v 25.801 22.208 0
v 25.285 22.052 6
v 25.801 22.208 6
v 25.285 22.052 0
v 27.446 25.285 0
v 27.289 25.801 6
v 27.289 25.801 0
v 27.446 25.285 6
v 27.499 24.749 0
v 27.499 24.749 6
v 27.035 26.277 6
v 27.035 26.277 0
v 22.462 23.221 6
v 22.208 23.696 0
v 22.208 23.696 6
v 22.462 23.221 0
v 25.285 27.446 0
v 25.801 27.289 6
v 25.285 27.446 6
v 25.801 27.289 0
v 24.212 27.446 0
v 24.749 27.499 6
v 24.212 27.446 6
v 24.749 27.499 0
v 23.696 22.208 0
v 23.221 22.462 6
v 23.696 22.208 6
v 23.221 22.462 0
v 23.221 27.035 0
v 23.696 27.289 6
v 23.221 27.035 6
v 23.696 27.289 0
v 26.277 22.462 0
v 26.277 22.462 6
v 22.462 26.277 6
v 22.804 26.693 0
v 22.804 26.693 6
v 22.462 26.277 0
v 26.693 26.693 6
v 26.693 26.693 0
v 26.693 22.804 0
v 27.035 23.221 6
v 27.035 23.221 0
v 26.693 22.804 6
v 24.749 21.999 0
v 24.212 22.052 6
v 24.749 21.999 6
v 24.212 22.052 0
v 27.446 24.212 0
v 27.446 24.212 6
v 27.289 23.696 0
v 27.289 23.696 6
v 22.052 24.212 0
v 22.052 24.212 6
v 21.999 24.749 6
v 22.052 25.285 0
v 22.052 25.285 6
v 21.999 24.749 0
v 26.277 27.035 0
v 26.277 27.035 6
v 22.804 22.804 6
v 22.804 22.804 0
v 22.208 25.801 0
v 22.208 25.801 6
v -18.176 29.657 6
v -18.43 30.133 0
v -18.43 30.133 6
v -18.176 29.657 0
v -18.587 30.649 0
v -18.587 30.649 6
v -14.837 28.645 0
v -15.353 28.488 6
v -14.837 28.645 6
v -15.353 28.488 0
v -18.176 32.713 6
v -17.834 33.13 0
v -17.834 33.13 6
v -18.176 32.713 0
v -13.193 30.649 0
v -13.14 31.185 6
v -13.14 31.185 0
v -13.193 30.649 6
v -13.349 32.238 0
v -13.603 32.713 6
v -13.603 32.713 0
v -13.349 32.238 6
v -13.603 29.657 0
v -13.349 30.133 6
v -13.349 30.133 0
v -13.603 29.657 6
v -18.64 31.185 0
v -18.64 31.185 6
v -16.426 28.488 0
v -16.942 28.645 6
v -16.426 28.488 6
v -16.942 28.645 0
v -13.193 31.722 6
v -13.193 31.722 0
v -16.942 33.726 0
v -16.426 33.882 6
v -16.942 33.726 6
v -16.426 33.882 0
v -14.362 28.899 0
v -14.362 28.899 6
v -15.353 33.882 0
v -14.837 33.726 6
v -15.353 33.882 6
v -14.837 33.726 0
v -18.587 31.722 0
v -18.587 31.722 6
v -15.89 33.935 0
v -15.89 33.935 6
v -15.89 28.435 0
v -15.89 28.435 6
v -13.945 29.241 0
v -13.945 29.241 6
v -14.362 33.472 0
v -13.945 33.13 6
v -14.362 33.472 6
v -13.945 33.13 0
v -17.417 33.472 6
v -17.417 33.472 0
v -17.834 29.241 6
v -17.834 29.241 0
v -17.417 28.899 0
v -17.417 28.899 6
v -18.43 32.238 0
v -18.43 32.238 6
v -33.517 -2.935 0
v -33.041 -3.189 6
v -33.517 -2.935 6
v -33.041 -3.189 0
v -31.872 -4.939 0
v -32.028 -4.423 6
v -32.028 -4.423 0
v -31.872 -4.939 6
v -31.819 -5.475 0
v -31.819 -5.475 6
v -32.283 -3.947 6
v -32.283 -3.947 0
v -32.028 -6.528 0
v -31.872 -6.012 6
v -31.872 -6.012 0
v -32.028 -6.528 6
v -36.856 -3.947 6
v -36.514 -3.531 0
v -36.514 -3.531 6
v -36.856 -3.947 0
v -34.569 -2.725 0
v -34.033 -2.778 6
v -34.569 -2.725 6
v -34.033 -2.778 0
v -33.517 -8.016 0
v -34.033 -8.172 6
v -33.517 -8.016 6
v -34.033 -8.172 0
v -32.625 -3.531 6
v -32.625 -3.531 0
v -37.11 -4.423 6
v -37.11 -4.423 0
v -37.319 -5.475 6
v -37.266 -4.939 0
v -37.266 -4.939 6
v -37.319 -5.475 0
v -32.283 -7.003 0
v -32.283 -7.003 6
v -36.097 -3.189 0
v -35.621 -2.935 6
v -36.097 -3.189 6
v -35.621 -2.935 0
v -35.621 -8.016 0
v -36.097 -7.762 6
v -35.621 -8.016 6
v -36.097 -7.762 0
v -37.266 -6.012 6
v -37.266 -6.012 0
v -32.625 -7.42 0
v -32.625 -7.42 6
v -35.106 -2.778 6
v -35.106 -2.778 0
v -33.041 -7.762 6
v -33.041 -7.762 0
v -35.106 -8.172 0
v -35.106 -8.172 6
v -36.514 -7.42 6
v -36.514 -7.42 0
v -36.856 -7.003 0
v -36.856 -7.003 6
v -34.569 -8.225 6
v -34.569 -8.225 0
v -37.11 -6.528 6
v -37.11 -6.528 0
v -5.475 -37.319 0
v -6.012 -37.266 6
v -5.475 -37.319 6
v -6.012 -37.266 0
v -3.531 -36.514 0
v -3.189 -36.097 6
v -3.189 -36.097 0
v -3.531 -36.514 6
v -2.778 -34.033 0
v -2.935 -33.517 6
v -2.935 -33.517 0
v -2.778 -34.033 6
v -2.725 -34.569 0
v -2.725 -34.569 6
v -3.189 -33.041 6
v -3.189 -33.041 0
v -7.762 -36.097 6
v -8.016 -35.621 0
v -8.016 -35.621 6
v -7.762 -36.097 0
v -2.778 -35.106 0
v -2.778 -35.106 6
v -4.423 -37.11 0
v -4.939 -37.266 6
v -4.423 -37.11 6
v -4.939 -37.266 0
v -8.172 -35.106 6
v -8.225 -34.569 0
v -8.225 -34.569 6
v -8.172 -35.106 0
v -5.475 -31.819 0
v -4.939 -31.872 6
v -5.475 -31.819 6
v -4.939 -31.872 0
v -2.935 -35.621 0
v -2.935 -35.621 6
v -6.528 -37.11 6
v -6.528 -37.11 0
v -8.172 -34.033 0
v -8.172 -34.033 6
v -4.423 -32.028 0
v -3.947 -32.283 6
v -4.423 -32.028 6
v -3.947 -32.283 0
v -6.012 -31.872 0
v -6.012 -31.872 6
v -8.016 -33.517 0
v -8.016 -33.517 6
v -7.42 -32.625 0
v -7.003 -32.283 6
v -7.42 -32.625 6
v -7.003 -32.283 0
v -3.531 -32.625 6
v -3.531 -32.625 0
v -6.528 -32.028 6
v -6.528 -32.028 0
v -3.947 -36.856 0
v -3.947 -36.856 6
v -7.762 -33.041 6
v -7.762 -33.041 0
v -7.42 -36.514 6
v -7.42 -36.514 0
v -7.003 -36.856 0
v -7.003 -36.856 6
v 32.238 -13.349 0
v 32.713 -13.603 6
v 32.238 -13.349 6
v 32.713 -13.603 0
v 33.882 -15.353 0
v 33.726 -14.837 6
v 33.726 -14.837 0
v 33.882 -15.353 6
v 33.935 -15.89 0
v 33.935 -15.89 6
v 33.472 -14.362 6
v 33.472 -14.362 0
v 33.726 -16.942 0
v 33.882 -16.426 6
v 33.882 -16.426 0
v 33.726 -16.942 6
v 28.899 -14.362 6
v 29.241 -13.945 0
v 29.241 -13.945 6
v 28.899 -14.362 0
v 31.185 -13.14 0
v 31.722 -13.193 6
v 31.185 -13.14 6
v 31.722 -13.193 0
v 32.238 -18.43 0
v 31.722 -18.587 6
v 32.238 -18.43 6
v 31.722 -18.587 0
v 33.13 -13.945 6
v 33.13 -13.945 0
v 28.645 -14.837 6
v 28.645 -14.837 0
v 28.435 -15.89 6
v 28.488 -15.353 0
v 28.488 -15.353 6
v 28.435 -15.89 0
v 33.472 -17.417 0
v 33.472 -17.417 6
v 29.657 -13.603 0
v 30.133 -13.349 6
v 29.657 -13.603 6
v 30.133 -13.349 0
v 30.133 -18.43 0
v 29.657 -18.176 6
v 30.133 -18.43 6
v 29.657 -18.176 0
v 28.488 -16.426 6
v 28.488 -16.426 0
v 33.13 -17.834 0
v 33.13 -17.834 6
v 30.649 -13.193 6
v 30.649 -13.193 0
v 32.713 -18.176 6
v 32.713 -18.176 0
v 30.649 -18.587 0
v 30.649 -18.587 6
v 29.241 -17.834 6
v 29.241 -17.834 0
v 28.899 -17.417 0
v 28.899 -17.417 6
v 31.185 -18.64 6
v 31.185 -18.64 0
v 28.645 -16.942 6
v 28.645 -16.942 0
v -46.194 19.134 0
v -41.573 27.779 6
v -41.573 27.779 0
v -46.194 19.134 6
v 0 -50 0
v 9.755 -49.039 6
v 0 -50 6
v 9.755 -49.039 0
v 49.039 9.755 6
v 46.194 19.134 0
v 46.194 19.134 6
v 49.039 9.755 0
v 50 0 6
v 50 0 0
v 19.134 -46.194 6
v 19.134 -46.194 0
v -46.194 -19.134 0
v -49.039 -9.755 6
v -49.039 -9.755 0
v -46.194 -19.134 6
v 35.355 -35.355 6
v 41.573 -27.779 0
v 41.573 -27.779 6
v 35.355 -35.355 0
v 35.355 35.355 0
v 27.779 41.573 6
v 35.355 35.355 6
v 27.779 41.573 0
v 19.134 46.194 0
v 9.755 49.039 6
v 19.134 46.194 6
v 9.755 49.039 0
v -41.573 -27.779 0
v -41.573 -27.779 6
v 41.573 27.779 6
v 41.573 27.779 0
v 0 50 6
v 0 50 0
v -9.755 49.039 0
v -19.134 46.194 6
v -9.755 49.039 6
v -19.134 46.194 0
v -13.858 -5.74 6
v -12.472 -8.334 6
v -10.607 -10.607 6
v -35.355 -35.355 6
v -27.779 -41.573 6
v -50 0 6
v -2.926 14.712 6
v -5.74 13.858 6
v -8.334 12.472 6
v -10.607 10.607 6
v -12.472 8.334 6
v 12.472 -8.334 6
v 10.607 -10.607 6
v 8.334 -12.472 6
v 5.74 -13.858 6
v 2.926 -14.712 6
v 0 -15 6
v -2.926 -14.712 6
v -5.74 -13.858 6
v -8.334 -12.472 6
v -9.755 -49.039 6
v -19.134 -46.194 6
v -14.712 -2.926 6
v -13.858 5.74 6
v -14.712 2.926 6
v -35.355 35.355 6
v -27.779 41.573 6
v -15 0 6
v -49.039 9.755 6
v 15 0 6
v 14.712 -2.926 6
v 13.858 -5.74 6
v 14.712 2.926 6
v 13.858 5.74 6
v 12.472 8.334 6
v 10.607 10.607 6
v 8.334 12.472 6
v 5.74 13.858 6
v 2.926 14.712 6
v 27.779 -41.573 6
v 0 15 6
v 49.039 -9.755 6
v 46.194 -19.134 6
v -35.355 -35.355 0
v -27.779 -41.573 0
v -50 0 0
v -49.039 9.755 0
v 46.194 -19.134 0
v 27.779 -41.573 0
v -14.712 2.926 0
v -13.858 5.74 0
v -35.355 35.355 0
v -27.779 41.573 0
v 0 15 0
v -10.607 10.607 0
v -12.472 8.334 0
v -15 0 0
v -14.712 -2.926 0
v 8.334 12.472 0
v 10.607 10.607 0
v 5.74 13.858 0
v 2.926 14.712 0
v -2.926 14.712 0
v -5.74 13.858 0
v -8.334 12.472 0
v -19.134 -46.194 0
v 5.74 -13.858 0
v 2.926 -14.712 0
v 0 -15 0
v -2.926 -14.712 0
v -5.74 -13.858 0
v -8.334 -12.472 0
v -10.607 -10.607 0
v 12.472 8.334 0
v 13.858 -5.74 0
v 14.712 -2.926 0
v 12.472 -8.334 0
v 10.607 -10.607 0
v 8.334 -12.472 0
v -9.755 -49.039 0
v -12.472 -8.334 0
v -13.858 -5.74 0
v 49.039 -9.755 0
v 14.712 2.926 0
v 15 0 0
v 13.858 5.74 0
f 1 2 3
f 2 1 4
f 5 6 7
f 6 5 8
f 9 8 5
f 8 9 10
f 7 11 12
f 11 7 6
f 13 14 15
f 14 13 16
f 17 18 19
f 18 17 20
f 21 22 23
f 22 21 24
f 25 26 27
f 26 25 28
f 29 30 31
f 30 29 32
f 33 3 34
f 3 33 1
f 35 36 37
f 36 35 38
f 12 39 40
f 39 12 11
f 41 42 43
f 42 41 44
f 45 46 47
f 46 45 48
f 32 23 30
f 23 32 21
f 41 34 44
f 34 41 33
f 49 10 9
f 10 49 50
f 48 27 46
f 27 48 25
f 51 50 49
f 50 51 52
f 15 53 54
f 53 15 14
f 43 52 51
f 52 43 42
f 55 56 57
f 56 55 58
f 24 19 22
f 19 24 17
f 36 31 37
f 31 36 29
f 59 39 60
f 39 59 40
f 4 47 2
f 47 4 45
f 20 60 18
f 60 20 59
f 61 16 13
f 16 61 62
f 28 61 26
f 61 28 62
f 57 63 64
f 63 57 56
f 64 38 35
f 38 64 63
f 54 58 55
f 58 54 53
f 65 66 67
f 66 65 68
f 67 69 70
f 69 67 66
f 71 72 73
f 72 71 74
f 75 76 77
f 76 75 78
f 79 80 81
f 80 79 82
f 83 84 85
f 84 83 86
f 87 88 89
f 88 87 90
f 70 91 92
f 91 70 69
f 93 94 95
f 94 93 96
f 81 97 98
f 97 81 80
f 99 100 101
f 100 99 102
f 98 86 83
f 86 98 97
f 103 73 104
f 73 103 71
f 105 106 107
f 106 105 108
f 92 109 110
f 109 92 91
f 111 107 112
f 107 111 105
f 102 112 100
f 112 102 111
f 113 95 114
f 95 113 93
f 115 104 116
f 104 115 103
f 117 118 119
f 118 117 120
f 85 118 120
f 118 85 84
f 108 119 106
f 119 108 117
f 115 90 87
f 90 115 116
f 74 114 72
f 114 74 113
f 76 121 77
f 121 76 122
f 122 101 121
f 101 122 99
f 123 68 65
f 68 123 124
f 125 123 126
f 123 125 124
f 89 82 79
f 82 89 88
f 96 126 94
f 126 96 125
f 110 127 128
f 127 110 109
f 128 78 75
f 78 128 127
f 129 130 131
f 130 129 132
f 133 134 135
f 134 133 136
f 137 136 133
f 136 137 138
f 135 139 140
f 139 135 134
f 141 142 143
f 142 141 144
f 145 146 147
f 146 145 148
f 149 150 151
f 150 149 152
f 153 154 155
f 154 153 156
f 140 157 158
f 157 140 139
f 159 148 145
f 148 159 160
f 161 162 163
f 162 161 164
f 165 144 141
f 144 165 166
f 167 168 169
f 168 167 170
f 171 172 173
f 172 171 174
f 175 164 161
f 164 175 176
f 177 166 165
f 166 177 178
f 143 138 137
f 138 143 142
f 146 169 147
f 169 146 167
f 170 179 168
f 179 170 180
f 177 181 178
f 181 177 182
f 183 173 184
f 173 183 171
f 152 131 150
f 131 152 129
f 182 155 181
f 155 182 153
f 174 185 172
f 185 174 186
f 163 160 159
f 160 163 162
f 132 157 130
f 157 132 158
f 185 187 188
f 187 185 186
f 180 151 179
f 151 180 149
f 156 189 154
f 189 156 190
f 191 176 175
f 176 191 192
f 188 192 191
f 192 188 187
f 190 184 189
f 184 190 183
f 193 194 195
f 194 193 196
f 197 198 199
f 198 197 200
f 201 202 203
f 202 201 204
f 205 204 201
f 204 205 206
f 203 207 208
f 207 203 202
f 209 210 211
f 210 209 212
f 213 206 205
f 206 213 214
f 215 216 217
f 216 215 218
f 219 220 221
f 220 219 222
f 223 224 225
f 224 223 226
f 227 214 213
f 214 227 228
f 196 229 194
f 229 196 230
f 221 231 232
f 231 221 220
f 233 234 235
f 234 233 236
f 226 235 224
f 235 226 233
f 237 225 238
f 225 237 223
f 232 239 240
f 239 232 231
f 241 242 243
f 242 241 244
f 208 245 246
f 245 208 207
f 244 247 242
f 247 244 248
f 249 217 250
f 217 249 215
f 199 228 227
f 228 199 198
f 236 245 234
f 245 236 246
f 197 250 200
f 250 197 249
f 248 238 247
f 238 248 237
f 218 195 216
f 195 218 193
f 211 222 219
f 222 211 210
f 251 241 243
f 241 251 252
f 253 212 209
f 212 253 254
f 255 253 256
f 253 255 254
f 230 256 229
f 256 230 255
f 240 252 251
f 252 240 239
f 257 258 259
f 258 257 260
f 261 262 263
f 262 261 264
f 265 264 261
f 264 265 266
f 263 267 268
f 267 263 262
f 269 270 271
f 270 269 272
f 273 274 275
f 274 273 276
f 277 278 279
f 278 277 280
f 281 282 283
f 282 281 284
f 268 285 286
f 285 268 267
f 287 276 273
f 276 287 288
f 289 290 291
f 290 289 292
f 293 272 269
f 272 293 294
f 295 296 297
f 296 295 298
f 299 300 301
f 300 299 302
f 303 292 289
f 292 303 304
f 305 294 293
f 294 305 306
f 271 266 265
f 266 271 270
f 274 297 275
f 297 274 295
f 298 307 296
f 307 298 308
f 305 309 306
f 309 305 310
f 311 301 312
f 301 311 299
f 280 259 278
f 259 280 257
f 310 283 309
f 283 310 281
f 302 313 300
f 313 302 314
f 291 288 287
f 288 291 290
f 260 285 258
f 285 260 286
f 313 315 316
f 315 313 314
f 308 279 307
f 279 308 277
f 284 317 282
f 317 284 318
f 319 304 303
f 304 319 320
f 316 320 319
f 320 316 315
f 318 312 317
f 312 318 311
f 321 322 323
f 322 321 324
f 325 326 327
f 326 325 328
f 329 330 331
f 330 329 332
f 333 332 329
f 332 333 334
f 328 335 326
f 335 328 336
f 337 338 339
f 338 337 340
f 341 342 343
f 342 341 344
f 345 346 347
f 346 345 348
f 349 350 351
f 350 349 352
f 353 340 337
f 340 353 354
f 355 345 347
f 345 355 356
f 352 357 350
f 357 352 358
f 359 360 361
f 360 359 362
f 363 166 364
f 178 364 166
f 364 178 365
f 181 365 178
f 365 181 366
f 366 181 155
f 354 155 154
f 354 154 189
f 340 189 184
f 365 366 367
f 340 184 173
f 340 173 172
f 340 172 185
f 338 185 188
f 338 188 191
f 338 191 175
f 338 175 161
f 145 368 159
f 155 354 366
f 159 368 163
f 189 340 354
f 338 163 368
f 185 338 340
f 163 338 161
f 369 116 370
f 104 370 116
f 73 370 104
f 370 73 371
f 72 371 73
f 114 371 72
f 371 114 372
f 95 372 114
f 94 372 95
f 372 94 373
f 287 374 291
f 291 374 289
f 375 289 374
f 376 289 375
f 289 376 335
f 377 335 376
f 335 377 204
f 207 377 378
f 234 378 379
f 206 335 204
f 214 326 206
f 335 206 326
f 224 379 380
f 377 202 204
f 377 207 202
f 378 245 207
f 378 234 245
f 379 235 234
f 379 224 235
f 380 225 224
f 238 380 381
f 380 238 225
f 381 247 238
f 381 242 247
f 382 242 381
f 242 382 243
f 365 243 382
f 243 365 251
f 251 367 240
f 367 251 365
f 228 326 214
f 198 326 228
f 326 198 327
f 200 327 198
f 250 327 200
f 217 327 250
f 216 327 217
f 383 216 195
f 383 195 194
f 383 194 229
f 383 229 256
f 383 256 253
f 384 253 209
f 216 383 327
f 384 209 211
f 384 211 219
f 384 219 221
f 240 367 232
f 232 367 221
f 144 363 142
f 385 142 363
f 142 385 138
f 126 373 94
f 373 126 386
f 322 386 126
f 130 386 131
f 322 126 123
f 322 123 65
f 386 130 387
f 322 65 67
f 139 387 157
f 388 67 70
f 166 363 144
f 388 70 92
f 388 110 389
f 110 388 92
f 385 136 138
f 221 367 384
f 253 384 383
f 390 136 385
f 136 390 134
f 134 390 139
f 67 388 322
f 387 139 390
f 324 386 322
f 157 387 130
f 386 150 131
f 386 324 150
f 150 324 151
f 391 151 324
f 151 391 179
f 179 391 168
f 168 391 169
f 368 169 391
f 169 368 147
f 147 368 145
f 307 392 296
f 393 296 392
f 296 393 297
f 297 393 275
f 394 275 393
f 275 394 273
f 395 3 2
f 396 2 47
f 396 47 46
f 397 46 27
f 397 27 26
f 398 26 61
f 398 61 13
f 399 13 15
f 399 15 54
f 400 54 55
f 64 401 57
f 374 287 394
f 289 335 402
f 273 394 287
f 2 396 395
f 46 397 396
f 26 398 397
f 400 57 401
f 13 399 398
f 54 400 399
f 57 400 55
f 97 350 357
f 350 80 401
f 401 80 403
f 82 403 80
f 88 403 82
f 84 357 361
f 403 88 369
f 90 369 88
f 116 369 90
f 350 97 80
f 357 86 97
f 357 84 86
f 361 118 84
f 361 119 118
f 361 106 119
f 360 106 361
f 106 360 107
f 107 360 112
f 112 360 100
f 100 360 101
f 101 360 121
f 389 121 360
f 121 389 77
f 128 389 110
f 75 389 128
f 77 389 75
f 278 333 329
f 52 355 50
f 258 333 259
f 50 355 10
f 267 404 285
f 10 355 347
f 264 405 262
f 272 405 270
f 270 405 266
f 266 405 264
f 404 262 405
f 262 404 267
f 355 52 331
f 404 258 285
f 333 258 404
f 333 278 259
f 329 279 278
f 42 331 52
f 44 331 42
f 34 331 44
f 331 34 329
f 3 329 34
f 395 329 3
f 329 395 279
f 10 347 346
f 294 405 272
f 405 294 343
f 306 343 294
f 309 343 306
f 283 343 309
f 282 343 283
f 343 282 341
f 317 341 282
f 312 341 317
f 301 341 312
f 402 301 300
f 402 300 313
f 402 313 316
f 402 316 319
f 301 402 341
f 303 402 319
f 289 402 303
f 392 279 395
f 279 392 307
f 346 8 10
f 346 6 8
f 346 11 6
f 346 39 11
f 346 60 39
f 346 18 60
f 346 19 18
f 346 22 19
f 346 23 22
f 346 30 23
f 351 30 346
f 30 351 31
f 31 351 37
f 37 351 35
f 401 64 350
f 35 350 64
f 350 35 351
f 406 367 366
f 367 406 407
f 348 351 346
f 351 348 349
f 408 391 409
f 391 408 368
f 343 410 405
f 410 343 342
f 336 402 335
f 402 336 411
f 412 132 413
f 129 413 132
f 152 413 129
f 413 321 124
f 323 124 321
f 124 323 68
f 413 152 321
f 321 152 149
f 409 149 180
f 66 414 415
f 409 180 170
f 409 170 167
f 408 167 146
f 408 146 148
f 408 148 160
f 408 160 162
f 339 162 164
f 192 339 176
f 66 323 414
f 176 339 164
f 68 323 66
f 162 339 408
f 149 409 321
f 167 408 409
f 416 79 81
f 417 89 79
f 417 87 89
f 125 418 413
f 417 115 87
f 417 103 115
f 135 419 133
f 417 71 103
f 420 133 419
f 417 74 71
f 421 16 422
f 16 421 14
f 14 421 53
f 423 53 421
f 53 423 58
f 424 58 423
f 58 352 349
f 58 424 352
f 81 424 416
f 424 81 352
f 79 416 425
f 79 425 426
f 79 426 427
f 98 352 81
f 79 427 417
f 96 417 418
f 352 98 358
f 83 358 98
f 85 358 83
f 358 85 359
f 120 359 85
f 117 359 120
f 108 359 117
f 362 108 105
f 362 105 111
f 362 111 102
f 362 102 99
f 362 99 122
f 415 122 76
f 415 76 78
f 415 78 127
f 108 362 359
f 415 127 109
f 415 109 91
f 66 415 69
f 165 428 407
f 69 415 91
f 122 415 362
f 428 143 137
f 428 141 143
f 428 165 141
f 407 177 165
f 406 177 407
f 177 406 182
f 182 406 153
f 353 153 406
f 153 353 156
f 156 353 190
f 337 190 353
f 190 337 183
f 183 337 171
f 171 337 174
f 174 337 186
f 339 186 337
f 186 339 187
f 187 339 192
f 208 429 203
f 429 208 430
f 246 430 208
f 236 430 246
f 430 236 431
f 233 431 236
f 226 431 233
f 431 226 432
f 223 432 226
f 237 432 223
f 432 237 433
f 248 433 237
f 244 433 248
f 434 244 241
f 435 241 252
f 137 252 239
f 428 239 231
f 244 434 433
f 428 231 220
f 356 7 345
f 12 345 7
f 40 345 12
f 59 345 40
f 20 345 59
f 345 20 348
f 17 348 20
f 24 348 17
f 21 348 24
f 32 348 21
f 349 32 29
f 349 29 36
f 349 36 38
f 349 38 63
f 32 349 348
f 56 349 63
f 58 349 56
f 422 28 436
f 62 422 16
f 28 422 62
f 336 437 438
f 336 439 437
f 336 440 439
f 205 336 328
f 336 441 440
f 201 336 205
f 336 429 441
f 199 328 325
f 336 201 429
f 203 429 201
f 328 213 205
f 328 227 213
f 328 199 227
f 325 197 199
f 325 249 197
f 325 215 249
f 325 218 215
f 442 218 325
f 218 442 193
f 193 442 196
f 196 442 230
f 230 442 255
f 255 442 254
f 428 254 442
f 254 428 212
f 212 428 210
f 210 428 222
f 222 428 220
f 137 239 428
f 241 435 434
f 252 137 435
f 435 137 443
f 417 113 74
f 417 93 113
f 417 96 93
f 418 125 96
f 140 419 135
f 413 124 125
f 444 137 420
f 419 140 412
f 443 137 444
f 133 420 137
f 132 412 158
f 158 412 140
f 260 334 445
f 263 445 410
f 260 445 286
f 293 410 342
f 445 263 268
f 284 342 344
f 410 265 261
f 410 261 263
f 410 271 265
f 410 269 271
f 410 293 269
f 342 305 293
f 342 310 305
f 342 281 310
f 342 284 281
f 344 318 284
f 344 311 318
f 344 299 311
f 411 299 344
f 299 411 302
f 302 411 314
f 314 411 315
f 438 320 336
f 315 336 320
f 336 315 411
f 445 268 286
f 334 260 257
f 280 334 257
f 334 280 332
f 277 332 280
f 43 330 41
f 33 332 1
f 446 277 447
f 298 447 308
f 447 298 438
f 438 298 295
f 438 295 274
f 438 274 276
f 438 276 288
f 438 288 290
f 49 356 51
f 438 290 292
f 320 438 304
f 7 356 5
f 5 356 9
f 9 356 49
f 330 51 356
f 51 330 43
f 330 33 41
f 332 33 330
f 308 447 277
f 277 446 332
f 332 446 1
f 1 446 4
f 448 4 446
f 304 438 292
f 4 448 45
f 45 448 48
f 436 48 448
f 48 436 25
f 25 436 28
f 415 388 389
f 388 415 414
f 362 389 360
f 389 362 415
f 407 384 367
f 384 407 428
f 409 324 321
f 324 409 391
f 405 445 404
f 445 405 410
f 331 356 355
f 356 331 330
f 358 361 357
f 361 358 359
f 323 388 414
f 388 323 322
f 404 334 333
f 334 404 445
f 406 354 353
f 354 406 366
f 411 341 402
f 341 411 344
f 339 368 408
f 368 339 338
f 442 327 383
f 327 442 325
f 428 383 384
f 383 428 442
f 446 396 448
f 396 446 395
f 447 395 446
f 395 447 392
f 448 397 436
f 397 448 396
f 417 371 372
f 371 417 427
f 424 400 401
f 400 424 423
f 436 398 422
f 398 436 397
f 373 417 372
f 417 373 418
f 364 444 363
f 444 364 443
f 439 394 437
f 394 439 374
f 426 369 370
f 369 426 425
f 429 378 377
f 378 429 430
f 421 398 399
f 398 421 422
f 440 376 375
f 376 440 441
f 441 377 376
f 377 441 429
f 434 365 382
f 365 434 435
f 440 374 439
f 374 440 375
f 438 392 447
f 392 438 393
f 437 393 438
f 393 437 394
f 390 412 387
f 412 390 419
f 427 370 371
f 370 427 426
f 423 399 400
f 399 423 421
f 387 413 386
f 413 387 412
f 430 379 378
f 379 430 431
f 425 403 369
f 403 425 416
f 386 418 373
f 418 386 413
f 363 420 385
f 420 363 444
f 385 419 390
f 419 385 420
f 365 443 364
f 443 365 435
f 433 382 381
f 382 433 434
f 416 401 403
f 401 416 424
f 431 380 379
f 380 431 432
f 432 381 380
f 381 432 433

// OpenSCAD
$fn = 32;

// ----------------------------------------------------------------------
// Flange Ø100 x 6
// 5 holes on a Ø70 bolt circle, bolted joints
// ----------------------------------------------------------------------

// --- parameters (mm) ---
flange_d = 100;   // outside diameter of the flange
seat_tol = 0.05;  // tolerance at the seating features
free_tol = 0.3;   // general tolerance on the free sizes
thickness = 6;    // flange thickness
holes = 5;        // number of bolt holes
pcd = 70;         // bolt circle diameter
start_deg = 45;   // angle of the first hole, from +X
hole_d = 5.5;     // bolt hole diameter
bore_d = 30;      // central through bore
hub_d = 42;       // hub outside diameter
hub_h = 0;        // hub height above the flange face (0 = no hub)

// --- derived feature positions (mm) ---
height = thickness + hub_h;  // = 6   overall height of the part
pcd_r = pcd / 2;             // = 35   bolt circle radius
hole_step = 360 / holes;     // = 72   angular pitch
feature_centers = [
  [pcd_r * cos(start_deg + 0 * hole_step), pcd_r * sin(start_deg + 0 * hole_step)],
  [pcd_r * cos(start_deg + 1 * hole_step), pcd_r * sin(start_deg + 1 * hole_step)],
  [pcd_r * cos(start_deg + 2 * hole_step), pcd_r * sin(start_deg + 2 * hole_step)],
  [pcd_r * cos(start_deg + 3 * hole_step), pcd_r * sin(start_deg + 3 * hole_step)],
  [pcd_r * cos(start_deg + 4 * hole_step), pcd_r * sin(start_deg + 4 * hole_step)]
];   // bolt hole centres on the pitch circle

// flange disc, every hole and the bore cut straight through
difference() {
  union() {
    cylinder(d = flange_d, h = thickness);
  }
  translate([0, 0, -1]) cylinder(d = bore_d, h = height + 2);  // bore, through
  for (centre = feature_centers)
    translate([centre[0], centre[1], -1]) cylinder(d = hole_d, h = thickness + 2);
}
